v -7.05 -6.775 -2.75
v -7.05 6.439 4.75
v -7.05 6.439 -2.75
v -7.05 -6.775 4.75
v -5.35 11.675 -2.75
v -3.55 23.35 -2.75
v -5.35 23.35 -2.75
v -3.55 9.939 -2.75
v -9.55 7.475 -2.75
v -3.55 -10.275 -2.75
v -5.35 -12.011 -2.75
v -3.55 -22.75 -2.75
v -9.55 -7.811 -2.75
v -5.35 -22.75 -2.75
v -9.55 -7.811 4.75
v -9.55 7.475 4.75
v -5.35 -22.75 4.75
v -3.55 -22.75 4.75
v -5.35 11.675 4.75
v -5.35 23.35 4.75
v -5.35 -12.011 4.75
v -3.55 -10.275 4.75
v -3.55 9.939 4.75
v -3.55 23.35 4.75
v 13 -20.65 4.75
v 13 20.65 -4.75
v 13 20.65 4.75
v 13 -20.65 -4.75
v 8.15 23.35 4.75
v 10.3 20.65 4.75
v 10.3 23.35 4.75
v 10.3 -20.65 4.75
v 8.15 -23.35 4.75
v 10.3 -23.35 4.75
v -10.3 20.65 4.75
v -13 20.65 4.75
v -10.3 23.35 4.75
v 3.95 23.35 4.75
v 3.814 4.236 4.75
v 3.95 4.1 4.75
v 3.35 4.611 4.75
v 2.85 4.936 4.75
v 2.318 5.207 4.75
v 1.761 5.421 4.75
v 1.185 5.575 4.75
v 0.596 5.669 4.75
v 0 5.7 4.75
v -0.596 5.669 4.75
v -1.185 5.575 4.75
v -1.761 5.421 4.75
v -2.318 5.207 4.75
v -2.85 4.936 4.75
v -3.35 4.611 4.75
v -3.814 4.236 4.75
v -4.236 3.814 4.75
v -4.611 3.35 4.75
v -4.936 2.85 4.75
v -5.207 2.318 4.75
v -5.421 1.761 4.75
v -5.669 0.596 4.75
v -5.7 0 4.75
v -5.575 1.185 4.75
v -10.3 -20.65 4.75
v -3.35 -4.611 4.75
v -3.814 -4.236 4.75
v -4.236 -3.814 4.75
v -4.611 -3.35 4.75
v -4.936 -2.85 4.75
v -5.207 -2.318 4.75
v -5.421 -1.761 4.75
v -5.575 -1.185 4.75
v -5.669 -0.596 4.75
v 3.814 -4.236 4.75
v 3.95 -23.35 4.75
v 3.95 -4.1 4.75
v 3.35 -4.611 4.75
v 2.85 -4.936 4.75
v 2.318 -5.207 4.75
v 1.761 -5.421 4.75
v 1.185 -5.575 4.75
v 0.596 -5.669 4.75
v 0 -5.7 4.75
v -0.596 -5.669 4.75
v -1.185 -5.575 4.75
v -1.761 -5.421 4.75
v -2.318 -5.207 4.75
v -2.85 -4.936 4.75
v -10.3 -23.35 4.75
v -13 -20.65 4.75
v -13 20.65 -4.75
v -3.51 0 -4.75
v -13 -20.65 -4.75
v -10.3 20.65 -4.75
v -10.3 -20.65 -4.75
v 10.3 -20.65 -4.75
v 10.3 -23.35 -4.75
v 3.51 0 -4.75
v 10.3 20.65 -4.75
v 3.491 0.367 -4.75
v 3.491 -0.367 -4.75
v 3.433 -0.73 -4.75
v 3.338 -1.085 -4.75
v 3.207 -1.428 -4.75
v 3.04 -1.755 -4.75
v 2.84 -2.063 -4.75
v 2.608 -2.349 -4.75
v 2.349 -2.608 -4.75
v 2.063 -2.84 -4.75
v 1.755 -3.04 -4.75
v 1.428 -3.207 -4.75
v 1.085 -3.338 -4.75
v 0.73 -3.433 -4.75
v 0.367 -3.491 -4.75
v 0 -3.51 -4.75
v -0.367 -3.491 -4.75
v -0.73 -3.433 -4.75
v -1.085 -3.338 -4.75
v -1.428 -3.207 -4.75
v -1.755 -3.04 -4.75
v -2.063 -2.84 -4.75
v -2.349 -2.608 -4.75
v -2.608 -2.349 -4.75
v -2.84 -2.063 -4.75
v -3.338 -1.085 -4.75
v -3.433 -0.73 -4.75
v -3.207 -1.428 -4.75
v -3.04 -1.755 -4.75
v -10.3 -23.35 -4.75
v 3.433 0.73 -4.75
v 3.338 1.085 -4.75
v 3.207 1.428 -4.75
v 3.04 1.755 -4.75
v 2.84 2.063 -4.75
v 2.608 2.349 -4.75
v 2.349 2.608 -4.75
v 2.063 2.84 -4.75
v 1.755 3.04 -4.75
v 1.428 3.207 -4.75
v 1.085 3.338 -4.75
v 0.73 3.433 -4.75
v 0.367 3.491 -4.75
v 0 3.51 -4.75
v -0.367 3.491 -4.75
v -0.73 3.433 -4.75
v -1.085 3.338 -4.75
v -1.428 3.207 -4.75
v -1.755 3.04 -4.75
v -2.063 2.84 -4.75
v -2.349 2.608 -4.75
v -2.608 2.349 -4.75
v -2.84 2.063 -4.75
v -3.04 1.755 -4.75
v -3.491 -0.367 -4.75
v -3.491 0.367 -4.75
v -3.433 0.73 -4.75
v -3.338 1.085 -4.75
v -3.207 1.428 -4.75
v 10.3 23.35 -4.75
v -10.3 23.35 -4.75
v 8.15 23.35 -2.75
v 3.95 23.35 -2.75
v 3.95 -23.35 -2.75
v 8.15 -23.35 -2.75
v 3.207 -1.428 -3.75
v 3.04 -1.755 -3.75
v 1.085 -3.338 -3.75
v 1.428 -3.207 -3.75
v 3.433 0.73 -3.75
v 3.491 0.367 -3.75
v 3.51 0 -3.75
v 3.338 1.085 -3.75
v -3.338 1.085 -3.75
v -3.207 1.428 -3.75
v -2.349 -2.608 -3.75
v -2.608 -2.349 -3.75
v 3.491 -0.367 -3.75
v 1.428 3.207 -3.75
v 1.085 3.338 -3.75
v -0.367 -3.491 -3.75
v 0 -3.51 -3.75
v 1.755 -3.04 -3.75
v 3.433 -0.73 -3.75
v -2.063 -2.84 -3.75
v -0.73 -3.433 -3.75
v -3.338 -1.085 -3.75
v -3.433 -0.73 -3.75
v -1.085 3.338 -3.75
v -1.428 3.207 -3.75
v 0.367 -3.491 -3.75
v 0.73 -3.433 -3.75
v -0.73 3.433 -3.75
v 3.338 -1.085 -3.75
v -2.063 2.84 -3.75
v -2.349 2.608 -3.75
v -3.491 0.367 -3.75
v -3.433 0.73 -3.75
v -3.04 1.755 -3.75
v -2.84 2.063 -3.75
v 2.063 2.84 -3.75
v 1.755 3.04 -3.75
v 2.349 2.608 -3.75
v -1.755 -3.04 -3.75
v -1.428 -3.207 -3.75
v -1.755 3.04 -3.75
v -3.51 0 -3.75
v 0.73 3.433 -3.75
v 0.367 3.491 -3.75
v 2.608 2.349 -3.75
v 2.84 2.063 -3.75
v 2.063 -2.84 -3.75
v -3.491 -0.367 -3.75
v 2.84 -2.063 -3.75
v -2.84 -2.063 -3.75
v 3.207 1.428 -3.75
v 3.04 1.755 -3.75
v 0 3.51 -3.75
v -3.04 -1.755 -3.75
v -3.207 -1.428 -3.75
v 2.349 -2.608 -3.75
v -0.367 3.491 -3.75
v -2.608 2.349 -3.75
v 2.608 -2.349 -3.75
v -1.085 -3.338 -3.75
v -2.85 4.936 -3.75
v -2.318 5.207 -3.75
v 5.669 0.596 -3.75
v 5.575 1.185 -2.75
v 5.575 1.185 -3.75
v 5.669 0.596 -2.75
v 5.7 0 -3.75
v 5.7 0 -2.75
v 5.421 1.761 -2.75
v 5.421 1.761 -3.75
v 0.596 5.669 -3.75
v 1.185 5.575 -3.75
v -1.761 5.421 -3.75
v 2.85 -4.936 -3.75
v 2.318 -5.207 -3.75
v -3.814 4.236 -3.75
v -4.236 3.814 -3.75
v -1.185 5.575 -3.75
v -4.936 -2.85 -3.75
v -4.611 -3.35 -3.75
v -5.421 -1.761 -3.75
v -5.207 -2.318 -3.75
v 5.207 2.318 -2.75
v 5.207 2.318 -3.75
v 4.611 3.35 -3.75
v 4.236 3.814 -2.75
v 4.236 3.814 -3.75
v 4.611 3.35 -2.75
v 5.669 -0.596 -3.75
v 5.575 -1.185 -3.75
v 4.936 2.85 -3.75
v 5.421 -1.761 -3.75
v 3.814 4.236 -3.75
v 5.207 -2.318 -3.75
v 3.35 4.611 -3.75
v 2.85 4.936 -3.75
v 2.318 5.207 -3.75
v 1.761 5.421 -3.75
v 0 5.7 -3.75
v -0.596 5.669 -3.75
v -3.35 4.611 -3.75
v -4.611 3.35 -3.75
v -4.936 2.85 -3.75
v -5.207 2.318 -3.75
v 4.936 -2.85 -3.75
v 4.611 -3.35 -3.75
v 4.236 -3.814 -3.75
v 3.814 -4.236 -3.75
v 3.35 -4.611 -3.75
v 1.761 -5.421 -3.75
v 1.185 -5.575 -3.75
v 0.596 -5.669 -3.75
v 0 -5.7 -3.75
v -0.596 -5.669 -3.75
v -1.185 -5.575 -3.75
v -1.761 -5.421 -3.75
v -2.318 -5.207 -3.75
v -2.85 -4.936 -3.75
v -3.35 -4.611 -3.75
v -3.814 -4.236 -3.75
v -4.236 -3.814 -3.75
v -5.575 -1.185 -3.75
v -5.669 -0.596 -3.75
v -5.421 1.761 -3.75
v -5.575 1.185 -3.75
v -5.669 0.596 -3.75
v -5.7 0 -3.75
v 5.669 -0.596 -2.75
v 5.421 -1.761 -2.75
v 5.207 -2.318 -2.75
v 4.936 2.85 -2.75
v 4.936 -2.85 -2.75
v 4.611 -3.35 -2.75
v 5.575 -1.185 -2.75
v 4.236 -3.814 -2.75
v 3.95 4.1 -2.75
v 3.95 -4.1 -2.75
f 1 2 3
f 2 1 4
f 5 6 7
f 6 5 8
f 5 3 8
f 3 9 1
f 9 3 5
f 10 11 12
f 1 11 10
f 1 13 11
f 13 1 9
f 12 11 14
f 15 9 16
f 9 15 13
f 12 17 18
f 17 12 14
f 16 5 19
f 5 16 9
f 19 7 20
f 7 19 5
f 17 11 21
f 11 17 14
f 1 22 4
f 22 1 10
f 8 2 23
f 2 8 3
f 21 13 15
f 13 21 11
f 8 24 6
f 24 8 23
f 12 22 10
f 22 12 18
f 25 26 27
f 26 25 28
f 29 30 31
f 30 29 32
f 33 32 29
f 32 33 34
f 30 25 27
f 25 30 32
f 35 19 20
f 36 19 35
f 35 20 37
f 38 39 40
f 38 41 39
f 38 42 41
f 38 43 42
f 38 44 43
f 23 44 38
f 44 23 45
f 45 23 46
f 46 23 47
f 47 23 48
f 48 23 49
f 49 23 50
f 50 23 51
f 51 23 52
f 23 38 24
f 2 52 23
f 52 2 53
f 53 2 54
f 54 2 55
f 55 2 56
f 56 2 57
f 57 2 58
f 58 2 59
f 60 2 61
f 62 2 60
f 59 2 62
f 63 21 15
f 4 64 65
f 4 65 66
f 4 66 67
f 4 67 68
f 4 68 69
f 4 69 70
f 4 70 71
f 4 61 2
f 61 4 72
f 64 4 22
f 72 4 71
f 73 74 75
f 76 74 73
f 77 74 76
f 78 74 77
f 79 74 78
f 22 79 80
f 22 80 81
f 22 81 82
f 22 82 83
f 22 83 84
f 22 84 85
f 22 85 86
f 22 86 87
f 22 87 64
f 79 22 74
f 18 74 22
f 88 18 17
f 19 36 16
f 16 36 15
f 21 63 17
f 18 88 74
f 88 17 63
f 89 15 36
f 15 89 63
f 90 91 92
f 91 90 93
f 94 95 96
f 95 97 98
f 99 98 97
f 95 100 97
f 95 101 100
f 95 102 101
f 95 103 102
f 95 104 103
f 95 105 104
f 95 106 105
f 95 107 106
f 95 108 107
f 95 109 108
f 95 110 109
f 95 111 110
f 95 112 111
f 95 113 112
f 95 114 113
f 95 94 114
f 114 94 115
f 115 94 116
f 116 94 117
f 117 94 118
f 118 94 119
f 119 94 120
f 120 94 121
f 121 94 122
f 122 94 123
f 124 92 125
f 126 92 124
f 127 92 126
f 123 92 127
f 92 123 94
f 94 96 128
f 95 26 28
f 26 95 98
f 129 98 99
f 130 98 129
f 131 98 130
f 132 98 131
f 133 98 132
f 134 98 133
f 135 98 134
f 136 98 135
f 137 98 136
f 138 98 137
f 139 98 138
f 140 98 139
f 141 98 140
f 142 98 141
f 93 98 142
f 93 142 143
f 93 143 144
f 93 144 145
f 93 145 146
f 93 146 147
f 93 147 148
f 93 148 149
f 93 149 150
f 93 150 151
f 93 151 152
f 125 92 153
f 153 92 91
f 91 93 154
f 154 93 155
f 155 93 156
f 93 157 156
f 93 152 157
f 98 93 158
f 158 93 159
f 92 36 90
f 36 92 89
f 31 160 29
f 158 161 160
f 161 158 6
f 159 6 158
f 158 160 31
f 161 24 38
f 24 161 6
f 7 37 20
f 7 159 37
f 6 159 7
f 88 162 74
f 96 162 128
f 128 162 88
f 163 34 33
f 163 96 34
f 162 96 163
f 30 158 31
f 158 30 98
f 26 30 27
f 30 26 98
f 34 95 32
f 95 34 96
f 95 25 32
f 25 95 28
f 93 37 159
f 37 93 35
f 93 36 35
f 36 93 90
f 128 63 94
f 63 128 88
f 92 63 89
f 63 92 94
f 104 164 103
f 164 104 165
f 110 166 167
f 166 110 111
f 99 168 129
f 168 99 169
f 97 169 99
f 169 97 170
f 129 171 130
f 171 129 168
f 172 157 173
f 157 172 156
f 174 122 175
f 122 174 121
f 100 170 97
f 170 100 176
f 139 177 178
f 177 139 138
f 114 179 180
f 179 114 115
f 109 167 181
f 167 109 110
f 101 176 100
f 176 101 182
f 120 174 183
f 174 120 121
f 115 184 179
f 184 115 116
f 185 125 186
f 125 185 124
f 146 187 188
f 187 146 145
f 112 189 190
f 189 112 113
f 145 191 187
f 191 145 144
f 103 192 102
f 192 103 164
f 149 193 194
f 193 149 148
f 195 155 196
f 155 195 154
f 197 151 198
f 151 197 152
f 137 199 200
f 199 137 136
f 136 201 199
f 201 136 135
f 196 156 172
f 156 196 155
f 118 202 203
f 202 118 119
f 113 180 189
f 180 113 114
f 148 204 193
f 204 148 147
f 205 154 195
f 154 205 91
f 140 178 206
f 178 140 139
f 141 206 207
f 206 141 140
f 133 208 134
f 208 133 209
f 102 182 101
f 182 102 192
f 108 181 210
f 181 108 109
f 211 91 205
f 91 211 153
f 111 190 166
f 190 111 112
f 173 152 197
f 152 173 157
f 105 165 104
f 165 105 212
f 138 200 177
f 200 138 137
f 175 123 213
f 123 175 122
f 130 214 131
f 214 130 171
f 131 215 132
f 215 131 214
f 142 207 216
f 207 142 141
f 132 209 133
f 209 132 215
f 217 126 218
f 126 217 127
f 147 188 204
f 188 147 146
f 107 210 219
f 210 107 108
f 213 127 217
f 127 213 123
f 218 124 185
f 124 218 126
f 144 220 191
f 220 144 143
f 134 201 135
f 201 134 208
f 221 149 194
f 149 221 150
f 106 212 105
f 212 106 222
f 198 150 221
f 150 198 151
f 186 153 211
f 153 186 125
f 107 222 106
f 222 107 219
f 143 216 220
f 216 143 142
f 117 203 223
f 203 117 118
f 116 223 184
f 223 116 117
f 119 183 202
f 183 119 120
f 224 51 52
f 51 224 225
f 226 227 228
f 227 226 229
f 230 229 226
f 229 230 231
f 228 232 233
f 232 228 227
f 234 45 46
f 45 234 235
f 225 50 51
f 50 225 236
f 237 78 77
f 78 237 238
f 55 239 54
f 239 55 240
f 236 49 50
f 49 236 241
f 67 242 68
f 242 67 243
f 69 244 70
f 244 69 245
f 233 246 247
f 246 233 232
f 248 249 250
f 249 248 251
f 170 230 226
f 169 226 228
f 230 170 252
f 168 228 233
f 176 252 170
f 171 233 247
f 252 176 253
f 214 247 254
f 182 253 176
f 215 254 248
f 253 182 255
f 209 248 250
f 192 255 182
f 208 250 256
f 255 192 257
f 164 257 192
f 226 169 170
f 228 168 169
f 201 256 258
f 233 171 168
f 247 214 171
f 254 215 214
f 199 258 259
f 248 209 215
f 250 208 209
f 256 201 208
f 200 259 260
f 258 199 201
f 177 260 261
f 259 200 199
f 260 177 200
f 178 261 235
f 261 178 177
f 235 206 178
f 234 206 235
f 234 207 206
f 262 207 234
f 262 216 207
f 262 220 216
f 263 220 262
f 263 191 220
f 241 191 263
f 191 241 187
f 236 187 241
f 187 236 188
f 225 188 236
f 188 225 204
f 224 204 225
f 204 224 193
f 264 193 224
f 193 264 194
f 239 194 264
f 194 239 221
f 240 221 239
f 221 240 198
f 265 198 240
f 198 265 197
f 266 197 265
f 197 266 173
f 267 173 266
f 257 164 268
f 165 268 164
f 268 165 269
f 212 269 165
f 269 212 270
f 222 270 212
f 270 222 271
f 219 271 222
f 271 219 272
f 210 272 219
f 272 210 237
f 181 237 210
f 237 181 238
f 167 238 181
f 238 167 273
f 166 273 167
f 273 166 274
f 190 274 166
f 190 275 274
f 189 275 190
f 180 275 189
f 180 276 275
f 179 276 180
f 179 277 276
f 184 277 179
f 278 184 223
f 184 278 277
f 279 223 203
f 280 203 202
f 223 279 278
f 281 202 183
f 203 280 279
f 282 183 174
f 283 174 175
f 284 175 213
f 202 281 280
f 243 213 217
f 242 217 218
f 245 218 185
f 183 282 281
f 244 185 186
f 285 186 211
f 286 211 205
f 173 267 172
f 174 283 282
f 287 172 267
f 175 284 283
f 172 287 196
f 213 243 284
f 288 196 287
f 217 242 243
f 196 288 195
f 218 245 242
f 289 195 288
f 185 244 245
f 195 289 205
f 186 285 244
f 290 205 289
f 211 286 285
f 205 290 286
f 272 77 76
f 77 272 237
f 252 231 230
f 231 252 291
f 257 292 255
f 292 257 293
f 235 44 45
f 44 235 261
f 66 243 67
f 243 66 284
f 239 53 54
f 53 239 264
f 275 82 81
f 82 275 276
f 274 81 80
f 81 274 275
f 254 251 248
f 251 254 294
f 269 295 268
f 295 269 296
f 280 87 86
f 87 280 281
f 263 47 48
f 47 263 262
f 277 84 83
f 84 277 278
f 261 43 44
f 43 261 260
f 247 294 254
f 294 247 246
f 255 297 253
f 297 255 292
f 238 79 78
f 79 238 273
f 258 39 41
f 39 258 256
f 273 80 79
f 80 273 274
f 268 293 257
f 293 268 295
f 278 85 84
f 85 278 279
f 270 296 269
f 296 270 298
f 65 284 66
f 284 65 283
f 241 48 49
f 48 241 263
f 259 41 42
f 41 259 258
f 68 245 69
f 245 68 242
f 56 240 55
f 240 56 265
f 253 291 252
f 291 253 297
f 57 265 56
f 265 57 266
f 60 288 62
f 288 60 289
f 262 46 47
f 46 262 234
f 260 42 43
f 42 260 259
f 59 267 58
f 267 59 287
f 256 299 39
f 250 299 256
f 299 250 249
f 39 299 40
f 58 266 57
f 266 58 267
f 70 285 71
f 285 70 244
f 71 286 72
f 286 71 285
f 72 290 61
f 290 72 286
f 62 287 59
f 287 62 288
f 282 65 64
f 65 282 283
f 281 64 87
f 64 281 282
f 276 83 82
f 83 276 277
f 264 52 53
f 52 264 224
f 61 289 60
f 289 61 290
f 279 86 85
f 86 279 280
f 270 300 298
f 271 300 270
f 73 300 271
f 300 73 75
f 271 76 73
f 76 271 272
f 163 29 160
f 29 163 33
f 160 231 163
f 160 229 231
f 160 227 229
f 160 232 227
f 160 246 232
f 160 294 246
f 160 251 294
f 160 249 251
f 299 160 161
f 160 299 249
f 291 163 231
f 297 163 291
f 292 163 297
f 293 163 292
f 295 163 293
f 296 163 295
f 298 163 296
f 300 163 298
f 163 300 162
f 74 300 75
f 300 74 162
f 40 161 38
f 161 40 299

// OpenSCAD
innerWidth = 21; // - .2 * 2;
outerWidth = innerWidth + 5;
innerLength = 41.7; // - .2 * 2;
outerLength = innerLength + 5;
innerHeight = 9.5;
channelDepth = .1;
channelWidth = 2; // - .2 * 2;
boltHeadDiameter = 11; // + .4 * 2;
boltShaftDiameter = 6.22; // + .4 * 2;
washerThickness = 1.64;
washerDiameter = 12.16; // + .4 * 2;

beltWidth = 6;
beltThickness = 1.4;
beltThicknessWithoutTeeth = .7;
beltToBeltThickness = beltThickness + beltThicknessWithoutTeeth;
toothThickness = 1;
toothSpacing = .8;

beltSpaceOuter = 13.5;

module baseCube() {
    cube([outerWidth, outerLength, innerHeight], center = true);
}

module baseCutout() {
    translate([innerWidth / 2 - .2, innerLength / 2 - .2, -50]) {
        cube([100, 100, 100]);
    }
}

module railCutout() {
    railspace = beltThickness * 3;
    railfromend = (outerLength + 2) / 4;

    translate([-railspace - beltToBeltThickness - outerWidth / 8, -(outerLength + 2) / 2, -innerHeight / 2 + 2]) {
        intersection() {
            union() {
                // outer (top)
                difference() {
                    cube([beltToBeltThickness + .4, outerLength + 2, innerHeight]);

                    // left
                    translate([railspace, outerLength + 2 - railfromend - beltToBeltThickness, 0]) {
                        rotate(-45, [0, 0, 1]) {
                            translate([-beltToBeltThickness - 100, -10, 0]) {
                                cube([beltToBeltThickness + 100, outerLength + 2, innerHeight]);
                            }
                        }
                    }

                    // right
                    translate([beltToBeltThickness + railspace, railfromend, 0]) {
                        rotate(180 + 45, [0, 0, 1]) {
                            translate([beltToBeltThickness, -10, 0]) {
                                cube([beltToBeltThickness + 100, outerLength + 2, innerHeight]);
                            }
                        }
                    }
                }

                // left
                translate([railspace, outerLength + 2 - railfromend - beltToBeltThickness, 0]) {
                    rotate(-45, [0, 0, 1]) {
                        translate([0, -10, 0]) {
                            cube([beltToBeltThickness + .4, outerLength + 2, innerHeight]);
                        }
                    }
                }

                // right
                translate([beltToBeltThickness + railspace, railfromend, 0]) {
                    rotate(180 + 45, [0, 0, 1]) {
                        translate([0, -10, 0]) {
                            cube([beltToBeltThickness + .4, outerLength + 2, innerHeight]);
                        }
                    }
                }

                // inner
                difference() {
                    translate([railspace, 0, 0]) {
                        cube([beltToBeltThickness + .4, outerLength + 2, innerHeight]);
                    }

                    // right
                    translate([beltToBeltThickness + railspace, railfromend, 0]) {
                        rotate(180 + 45, [0, 0, 1]) {
                            translate([-beltToBeltThickness - 4, -10, 0]) {
                                cube([beltToBeltThickness + 4, outerLength + 2, innerHeight]);
                            }
                        }
                    }

                    // left
                    translate([railspace, outerLength + 2 - railfromend - beltToBeltThickness, 0]) {
                        rotate(-45, [0, 0, 1]) {
                            translate([beltToBeltThickness, -10, 0]) {
                                cube([beltToBeltThickness + 10, outerLength + 2, innerHeight]);
                            }
                        }
                    }
                }
            }

            cube([beltThickness + railspace + .4, outerLength + 2, innerHeight]);
        }
    }
}

// this gives an idea of where the belt will slide
// cube(beltSpaceOuter, center = true);

difference() {
    baseCube();

    // corners
    baseCutout();
    scale([1, -1, 1]) baseCutout();
    scale([-1, 1, 1]) baseCutout();
    scale([-1, -1, 1]) baseCutout();

    translate([0, 0, -50]) {
        cylinder(h = 100, d = boltShaftDiameter + .4 * 2, $fn = 60);
    }
    translate([0, 0, -innerHeight / 2 + 1]) {
        cylinder(h = 100, d = boltHeadDiameter + .2 * 2, $fn = 60);
    }

    translate([0, 1.6, 0]) {
        railCutout();
    }

    beltSlidingWidth = beltThickness * 3;
    translate([(-beltSlidingWidth + beltSpaceOuter - beltThickness) / 2, -(outerLength + 2) / 2, -innerHeight / 2 + 2]) {
        cube([beltSlidingWidth, outerLength + 2, innerHeight]);
    }
}
